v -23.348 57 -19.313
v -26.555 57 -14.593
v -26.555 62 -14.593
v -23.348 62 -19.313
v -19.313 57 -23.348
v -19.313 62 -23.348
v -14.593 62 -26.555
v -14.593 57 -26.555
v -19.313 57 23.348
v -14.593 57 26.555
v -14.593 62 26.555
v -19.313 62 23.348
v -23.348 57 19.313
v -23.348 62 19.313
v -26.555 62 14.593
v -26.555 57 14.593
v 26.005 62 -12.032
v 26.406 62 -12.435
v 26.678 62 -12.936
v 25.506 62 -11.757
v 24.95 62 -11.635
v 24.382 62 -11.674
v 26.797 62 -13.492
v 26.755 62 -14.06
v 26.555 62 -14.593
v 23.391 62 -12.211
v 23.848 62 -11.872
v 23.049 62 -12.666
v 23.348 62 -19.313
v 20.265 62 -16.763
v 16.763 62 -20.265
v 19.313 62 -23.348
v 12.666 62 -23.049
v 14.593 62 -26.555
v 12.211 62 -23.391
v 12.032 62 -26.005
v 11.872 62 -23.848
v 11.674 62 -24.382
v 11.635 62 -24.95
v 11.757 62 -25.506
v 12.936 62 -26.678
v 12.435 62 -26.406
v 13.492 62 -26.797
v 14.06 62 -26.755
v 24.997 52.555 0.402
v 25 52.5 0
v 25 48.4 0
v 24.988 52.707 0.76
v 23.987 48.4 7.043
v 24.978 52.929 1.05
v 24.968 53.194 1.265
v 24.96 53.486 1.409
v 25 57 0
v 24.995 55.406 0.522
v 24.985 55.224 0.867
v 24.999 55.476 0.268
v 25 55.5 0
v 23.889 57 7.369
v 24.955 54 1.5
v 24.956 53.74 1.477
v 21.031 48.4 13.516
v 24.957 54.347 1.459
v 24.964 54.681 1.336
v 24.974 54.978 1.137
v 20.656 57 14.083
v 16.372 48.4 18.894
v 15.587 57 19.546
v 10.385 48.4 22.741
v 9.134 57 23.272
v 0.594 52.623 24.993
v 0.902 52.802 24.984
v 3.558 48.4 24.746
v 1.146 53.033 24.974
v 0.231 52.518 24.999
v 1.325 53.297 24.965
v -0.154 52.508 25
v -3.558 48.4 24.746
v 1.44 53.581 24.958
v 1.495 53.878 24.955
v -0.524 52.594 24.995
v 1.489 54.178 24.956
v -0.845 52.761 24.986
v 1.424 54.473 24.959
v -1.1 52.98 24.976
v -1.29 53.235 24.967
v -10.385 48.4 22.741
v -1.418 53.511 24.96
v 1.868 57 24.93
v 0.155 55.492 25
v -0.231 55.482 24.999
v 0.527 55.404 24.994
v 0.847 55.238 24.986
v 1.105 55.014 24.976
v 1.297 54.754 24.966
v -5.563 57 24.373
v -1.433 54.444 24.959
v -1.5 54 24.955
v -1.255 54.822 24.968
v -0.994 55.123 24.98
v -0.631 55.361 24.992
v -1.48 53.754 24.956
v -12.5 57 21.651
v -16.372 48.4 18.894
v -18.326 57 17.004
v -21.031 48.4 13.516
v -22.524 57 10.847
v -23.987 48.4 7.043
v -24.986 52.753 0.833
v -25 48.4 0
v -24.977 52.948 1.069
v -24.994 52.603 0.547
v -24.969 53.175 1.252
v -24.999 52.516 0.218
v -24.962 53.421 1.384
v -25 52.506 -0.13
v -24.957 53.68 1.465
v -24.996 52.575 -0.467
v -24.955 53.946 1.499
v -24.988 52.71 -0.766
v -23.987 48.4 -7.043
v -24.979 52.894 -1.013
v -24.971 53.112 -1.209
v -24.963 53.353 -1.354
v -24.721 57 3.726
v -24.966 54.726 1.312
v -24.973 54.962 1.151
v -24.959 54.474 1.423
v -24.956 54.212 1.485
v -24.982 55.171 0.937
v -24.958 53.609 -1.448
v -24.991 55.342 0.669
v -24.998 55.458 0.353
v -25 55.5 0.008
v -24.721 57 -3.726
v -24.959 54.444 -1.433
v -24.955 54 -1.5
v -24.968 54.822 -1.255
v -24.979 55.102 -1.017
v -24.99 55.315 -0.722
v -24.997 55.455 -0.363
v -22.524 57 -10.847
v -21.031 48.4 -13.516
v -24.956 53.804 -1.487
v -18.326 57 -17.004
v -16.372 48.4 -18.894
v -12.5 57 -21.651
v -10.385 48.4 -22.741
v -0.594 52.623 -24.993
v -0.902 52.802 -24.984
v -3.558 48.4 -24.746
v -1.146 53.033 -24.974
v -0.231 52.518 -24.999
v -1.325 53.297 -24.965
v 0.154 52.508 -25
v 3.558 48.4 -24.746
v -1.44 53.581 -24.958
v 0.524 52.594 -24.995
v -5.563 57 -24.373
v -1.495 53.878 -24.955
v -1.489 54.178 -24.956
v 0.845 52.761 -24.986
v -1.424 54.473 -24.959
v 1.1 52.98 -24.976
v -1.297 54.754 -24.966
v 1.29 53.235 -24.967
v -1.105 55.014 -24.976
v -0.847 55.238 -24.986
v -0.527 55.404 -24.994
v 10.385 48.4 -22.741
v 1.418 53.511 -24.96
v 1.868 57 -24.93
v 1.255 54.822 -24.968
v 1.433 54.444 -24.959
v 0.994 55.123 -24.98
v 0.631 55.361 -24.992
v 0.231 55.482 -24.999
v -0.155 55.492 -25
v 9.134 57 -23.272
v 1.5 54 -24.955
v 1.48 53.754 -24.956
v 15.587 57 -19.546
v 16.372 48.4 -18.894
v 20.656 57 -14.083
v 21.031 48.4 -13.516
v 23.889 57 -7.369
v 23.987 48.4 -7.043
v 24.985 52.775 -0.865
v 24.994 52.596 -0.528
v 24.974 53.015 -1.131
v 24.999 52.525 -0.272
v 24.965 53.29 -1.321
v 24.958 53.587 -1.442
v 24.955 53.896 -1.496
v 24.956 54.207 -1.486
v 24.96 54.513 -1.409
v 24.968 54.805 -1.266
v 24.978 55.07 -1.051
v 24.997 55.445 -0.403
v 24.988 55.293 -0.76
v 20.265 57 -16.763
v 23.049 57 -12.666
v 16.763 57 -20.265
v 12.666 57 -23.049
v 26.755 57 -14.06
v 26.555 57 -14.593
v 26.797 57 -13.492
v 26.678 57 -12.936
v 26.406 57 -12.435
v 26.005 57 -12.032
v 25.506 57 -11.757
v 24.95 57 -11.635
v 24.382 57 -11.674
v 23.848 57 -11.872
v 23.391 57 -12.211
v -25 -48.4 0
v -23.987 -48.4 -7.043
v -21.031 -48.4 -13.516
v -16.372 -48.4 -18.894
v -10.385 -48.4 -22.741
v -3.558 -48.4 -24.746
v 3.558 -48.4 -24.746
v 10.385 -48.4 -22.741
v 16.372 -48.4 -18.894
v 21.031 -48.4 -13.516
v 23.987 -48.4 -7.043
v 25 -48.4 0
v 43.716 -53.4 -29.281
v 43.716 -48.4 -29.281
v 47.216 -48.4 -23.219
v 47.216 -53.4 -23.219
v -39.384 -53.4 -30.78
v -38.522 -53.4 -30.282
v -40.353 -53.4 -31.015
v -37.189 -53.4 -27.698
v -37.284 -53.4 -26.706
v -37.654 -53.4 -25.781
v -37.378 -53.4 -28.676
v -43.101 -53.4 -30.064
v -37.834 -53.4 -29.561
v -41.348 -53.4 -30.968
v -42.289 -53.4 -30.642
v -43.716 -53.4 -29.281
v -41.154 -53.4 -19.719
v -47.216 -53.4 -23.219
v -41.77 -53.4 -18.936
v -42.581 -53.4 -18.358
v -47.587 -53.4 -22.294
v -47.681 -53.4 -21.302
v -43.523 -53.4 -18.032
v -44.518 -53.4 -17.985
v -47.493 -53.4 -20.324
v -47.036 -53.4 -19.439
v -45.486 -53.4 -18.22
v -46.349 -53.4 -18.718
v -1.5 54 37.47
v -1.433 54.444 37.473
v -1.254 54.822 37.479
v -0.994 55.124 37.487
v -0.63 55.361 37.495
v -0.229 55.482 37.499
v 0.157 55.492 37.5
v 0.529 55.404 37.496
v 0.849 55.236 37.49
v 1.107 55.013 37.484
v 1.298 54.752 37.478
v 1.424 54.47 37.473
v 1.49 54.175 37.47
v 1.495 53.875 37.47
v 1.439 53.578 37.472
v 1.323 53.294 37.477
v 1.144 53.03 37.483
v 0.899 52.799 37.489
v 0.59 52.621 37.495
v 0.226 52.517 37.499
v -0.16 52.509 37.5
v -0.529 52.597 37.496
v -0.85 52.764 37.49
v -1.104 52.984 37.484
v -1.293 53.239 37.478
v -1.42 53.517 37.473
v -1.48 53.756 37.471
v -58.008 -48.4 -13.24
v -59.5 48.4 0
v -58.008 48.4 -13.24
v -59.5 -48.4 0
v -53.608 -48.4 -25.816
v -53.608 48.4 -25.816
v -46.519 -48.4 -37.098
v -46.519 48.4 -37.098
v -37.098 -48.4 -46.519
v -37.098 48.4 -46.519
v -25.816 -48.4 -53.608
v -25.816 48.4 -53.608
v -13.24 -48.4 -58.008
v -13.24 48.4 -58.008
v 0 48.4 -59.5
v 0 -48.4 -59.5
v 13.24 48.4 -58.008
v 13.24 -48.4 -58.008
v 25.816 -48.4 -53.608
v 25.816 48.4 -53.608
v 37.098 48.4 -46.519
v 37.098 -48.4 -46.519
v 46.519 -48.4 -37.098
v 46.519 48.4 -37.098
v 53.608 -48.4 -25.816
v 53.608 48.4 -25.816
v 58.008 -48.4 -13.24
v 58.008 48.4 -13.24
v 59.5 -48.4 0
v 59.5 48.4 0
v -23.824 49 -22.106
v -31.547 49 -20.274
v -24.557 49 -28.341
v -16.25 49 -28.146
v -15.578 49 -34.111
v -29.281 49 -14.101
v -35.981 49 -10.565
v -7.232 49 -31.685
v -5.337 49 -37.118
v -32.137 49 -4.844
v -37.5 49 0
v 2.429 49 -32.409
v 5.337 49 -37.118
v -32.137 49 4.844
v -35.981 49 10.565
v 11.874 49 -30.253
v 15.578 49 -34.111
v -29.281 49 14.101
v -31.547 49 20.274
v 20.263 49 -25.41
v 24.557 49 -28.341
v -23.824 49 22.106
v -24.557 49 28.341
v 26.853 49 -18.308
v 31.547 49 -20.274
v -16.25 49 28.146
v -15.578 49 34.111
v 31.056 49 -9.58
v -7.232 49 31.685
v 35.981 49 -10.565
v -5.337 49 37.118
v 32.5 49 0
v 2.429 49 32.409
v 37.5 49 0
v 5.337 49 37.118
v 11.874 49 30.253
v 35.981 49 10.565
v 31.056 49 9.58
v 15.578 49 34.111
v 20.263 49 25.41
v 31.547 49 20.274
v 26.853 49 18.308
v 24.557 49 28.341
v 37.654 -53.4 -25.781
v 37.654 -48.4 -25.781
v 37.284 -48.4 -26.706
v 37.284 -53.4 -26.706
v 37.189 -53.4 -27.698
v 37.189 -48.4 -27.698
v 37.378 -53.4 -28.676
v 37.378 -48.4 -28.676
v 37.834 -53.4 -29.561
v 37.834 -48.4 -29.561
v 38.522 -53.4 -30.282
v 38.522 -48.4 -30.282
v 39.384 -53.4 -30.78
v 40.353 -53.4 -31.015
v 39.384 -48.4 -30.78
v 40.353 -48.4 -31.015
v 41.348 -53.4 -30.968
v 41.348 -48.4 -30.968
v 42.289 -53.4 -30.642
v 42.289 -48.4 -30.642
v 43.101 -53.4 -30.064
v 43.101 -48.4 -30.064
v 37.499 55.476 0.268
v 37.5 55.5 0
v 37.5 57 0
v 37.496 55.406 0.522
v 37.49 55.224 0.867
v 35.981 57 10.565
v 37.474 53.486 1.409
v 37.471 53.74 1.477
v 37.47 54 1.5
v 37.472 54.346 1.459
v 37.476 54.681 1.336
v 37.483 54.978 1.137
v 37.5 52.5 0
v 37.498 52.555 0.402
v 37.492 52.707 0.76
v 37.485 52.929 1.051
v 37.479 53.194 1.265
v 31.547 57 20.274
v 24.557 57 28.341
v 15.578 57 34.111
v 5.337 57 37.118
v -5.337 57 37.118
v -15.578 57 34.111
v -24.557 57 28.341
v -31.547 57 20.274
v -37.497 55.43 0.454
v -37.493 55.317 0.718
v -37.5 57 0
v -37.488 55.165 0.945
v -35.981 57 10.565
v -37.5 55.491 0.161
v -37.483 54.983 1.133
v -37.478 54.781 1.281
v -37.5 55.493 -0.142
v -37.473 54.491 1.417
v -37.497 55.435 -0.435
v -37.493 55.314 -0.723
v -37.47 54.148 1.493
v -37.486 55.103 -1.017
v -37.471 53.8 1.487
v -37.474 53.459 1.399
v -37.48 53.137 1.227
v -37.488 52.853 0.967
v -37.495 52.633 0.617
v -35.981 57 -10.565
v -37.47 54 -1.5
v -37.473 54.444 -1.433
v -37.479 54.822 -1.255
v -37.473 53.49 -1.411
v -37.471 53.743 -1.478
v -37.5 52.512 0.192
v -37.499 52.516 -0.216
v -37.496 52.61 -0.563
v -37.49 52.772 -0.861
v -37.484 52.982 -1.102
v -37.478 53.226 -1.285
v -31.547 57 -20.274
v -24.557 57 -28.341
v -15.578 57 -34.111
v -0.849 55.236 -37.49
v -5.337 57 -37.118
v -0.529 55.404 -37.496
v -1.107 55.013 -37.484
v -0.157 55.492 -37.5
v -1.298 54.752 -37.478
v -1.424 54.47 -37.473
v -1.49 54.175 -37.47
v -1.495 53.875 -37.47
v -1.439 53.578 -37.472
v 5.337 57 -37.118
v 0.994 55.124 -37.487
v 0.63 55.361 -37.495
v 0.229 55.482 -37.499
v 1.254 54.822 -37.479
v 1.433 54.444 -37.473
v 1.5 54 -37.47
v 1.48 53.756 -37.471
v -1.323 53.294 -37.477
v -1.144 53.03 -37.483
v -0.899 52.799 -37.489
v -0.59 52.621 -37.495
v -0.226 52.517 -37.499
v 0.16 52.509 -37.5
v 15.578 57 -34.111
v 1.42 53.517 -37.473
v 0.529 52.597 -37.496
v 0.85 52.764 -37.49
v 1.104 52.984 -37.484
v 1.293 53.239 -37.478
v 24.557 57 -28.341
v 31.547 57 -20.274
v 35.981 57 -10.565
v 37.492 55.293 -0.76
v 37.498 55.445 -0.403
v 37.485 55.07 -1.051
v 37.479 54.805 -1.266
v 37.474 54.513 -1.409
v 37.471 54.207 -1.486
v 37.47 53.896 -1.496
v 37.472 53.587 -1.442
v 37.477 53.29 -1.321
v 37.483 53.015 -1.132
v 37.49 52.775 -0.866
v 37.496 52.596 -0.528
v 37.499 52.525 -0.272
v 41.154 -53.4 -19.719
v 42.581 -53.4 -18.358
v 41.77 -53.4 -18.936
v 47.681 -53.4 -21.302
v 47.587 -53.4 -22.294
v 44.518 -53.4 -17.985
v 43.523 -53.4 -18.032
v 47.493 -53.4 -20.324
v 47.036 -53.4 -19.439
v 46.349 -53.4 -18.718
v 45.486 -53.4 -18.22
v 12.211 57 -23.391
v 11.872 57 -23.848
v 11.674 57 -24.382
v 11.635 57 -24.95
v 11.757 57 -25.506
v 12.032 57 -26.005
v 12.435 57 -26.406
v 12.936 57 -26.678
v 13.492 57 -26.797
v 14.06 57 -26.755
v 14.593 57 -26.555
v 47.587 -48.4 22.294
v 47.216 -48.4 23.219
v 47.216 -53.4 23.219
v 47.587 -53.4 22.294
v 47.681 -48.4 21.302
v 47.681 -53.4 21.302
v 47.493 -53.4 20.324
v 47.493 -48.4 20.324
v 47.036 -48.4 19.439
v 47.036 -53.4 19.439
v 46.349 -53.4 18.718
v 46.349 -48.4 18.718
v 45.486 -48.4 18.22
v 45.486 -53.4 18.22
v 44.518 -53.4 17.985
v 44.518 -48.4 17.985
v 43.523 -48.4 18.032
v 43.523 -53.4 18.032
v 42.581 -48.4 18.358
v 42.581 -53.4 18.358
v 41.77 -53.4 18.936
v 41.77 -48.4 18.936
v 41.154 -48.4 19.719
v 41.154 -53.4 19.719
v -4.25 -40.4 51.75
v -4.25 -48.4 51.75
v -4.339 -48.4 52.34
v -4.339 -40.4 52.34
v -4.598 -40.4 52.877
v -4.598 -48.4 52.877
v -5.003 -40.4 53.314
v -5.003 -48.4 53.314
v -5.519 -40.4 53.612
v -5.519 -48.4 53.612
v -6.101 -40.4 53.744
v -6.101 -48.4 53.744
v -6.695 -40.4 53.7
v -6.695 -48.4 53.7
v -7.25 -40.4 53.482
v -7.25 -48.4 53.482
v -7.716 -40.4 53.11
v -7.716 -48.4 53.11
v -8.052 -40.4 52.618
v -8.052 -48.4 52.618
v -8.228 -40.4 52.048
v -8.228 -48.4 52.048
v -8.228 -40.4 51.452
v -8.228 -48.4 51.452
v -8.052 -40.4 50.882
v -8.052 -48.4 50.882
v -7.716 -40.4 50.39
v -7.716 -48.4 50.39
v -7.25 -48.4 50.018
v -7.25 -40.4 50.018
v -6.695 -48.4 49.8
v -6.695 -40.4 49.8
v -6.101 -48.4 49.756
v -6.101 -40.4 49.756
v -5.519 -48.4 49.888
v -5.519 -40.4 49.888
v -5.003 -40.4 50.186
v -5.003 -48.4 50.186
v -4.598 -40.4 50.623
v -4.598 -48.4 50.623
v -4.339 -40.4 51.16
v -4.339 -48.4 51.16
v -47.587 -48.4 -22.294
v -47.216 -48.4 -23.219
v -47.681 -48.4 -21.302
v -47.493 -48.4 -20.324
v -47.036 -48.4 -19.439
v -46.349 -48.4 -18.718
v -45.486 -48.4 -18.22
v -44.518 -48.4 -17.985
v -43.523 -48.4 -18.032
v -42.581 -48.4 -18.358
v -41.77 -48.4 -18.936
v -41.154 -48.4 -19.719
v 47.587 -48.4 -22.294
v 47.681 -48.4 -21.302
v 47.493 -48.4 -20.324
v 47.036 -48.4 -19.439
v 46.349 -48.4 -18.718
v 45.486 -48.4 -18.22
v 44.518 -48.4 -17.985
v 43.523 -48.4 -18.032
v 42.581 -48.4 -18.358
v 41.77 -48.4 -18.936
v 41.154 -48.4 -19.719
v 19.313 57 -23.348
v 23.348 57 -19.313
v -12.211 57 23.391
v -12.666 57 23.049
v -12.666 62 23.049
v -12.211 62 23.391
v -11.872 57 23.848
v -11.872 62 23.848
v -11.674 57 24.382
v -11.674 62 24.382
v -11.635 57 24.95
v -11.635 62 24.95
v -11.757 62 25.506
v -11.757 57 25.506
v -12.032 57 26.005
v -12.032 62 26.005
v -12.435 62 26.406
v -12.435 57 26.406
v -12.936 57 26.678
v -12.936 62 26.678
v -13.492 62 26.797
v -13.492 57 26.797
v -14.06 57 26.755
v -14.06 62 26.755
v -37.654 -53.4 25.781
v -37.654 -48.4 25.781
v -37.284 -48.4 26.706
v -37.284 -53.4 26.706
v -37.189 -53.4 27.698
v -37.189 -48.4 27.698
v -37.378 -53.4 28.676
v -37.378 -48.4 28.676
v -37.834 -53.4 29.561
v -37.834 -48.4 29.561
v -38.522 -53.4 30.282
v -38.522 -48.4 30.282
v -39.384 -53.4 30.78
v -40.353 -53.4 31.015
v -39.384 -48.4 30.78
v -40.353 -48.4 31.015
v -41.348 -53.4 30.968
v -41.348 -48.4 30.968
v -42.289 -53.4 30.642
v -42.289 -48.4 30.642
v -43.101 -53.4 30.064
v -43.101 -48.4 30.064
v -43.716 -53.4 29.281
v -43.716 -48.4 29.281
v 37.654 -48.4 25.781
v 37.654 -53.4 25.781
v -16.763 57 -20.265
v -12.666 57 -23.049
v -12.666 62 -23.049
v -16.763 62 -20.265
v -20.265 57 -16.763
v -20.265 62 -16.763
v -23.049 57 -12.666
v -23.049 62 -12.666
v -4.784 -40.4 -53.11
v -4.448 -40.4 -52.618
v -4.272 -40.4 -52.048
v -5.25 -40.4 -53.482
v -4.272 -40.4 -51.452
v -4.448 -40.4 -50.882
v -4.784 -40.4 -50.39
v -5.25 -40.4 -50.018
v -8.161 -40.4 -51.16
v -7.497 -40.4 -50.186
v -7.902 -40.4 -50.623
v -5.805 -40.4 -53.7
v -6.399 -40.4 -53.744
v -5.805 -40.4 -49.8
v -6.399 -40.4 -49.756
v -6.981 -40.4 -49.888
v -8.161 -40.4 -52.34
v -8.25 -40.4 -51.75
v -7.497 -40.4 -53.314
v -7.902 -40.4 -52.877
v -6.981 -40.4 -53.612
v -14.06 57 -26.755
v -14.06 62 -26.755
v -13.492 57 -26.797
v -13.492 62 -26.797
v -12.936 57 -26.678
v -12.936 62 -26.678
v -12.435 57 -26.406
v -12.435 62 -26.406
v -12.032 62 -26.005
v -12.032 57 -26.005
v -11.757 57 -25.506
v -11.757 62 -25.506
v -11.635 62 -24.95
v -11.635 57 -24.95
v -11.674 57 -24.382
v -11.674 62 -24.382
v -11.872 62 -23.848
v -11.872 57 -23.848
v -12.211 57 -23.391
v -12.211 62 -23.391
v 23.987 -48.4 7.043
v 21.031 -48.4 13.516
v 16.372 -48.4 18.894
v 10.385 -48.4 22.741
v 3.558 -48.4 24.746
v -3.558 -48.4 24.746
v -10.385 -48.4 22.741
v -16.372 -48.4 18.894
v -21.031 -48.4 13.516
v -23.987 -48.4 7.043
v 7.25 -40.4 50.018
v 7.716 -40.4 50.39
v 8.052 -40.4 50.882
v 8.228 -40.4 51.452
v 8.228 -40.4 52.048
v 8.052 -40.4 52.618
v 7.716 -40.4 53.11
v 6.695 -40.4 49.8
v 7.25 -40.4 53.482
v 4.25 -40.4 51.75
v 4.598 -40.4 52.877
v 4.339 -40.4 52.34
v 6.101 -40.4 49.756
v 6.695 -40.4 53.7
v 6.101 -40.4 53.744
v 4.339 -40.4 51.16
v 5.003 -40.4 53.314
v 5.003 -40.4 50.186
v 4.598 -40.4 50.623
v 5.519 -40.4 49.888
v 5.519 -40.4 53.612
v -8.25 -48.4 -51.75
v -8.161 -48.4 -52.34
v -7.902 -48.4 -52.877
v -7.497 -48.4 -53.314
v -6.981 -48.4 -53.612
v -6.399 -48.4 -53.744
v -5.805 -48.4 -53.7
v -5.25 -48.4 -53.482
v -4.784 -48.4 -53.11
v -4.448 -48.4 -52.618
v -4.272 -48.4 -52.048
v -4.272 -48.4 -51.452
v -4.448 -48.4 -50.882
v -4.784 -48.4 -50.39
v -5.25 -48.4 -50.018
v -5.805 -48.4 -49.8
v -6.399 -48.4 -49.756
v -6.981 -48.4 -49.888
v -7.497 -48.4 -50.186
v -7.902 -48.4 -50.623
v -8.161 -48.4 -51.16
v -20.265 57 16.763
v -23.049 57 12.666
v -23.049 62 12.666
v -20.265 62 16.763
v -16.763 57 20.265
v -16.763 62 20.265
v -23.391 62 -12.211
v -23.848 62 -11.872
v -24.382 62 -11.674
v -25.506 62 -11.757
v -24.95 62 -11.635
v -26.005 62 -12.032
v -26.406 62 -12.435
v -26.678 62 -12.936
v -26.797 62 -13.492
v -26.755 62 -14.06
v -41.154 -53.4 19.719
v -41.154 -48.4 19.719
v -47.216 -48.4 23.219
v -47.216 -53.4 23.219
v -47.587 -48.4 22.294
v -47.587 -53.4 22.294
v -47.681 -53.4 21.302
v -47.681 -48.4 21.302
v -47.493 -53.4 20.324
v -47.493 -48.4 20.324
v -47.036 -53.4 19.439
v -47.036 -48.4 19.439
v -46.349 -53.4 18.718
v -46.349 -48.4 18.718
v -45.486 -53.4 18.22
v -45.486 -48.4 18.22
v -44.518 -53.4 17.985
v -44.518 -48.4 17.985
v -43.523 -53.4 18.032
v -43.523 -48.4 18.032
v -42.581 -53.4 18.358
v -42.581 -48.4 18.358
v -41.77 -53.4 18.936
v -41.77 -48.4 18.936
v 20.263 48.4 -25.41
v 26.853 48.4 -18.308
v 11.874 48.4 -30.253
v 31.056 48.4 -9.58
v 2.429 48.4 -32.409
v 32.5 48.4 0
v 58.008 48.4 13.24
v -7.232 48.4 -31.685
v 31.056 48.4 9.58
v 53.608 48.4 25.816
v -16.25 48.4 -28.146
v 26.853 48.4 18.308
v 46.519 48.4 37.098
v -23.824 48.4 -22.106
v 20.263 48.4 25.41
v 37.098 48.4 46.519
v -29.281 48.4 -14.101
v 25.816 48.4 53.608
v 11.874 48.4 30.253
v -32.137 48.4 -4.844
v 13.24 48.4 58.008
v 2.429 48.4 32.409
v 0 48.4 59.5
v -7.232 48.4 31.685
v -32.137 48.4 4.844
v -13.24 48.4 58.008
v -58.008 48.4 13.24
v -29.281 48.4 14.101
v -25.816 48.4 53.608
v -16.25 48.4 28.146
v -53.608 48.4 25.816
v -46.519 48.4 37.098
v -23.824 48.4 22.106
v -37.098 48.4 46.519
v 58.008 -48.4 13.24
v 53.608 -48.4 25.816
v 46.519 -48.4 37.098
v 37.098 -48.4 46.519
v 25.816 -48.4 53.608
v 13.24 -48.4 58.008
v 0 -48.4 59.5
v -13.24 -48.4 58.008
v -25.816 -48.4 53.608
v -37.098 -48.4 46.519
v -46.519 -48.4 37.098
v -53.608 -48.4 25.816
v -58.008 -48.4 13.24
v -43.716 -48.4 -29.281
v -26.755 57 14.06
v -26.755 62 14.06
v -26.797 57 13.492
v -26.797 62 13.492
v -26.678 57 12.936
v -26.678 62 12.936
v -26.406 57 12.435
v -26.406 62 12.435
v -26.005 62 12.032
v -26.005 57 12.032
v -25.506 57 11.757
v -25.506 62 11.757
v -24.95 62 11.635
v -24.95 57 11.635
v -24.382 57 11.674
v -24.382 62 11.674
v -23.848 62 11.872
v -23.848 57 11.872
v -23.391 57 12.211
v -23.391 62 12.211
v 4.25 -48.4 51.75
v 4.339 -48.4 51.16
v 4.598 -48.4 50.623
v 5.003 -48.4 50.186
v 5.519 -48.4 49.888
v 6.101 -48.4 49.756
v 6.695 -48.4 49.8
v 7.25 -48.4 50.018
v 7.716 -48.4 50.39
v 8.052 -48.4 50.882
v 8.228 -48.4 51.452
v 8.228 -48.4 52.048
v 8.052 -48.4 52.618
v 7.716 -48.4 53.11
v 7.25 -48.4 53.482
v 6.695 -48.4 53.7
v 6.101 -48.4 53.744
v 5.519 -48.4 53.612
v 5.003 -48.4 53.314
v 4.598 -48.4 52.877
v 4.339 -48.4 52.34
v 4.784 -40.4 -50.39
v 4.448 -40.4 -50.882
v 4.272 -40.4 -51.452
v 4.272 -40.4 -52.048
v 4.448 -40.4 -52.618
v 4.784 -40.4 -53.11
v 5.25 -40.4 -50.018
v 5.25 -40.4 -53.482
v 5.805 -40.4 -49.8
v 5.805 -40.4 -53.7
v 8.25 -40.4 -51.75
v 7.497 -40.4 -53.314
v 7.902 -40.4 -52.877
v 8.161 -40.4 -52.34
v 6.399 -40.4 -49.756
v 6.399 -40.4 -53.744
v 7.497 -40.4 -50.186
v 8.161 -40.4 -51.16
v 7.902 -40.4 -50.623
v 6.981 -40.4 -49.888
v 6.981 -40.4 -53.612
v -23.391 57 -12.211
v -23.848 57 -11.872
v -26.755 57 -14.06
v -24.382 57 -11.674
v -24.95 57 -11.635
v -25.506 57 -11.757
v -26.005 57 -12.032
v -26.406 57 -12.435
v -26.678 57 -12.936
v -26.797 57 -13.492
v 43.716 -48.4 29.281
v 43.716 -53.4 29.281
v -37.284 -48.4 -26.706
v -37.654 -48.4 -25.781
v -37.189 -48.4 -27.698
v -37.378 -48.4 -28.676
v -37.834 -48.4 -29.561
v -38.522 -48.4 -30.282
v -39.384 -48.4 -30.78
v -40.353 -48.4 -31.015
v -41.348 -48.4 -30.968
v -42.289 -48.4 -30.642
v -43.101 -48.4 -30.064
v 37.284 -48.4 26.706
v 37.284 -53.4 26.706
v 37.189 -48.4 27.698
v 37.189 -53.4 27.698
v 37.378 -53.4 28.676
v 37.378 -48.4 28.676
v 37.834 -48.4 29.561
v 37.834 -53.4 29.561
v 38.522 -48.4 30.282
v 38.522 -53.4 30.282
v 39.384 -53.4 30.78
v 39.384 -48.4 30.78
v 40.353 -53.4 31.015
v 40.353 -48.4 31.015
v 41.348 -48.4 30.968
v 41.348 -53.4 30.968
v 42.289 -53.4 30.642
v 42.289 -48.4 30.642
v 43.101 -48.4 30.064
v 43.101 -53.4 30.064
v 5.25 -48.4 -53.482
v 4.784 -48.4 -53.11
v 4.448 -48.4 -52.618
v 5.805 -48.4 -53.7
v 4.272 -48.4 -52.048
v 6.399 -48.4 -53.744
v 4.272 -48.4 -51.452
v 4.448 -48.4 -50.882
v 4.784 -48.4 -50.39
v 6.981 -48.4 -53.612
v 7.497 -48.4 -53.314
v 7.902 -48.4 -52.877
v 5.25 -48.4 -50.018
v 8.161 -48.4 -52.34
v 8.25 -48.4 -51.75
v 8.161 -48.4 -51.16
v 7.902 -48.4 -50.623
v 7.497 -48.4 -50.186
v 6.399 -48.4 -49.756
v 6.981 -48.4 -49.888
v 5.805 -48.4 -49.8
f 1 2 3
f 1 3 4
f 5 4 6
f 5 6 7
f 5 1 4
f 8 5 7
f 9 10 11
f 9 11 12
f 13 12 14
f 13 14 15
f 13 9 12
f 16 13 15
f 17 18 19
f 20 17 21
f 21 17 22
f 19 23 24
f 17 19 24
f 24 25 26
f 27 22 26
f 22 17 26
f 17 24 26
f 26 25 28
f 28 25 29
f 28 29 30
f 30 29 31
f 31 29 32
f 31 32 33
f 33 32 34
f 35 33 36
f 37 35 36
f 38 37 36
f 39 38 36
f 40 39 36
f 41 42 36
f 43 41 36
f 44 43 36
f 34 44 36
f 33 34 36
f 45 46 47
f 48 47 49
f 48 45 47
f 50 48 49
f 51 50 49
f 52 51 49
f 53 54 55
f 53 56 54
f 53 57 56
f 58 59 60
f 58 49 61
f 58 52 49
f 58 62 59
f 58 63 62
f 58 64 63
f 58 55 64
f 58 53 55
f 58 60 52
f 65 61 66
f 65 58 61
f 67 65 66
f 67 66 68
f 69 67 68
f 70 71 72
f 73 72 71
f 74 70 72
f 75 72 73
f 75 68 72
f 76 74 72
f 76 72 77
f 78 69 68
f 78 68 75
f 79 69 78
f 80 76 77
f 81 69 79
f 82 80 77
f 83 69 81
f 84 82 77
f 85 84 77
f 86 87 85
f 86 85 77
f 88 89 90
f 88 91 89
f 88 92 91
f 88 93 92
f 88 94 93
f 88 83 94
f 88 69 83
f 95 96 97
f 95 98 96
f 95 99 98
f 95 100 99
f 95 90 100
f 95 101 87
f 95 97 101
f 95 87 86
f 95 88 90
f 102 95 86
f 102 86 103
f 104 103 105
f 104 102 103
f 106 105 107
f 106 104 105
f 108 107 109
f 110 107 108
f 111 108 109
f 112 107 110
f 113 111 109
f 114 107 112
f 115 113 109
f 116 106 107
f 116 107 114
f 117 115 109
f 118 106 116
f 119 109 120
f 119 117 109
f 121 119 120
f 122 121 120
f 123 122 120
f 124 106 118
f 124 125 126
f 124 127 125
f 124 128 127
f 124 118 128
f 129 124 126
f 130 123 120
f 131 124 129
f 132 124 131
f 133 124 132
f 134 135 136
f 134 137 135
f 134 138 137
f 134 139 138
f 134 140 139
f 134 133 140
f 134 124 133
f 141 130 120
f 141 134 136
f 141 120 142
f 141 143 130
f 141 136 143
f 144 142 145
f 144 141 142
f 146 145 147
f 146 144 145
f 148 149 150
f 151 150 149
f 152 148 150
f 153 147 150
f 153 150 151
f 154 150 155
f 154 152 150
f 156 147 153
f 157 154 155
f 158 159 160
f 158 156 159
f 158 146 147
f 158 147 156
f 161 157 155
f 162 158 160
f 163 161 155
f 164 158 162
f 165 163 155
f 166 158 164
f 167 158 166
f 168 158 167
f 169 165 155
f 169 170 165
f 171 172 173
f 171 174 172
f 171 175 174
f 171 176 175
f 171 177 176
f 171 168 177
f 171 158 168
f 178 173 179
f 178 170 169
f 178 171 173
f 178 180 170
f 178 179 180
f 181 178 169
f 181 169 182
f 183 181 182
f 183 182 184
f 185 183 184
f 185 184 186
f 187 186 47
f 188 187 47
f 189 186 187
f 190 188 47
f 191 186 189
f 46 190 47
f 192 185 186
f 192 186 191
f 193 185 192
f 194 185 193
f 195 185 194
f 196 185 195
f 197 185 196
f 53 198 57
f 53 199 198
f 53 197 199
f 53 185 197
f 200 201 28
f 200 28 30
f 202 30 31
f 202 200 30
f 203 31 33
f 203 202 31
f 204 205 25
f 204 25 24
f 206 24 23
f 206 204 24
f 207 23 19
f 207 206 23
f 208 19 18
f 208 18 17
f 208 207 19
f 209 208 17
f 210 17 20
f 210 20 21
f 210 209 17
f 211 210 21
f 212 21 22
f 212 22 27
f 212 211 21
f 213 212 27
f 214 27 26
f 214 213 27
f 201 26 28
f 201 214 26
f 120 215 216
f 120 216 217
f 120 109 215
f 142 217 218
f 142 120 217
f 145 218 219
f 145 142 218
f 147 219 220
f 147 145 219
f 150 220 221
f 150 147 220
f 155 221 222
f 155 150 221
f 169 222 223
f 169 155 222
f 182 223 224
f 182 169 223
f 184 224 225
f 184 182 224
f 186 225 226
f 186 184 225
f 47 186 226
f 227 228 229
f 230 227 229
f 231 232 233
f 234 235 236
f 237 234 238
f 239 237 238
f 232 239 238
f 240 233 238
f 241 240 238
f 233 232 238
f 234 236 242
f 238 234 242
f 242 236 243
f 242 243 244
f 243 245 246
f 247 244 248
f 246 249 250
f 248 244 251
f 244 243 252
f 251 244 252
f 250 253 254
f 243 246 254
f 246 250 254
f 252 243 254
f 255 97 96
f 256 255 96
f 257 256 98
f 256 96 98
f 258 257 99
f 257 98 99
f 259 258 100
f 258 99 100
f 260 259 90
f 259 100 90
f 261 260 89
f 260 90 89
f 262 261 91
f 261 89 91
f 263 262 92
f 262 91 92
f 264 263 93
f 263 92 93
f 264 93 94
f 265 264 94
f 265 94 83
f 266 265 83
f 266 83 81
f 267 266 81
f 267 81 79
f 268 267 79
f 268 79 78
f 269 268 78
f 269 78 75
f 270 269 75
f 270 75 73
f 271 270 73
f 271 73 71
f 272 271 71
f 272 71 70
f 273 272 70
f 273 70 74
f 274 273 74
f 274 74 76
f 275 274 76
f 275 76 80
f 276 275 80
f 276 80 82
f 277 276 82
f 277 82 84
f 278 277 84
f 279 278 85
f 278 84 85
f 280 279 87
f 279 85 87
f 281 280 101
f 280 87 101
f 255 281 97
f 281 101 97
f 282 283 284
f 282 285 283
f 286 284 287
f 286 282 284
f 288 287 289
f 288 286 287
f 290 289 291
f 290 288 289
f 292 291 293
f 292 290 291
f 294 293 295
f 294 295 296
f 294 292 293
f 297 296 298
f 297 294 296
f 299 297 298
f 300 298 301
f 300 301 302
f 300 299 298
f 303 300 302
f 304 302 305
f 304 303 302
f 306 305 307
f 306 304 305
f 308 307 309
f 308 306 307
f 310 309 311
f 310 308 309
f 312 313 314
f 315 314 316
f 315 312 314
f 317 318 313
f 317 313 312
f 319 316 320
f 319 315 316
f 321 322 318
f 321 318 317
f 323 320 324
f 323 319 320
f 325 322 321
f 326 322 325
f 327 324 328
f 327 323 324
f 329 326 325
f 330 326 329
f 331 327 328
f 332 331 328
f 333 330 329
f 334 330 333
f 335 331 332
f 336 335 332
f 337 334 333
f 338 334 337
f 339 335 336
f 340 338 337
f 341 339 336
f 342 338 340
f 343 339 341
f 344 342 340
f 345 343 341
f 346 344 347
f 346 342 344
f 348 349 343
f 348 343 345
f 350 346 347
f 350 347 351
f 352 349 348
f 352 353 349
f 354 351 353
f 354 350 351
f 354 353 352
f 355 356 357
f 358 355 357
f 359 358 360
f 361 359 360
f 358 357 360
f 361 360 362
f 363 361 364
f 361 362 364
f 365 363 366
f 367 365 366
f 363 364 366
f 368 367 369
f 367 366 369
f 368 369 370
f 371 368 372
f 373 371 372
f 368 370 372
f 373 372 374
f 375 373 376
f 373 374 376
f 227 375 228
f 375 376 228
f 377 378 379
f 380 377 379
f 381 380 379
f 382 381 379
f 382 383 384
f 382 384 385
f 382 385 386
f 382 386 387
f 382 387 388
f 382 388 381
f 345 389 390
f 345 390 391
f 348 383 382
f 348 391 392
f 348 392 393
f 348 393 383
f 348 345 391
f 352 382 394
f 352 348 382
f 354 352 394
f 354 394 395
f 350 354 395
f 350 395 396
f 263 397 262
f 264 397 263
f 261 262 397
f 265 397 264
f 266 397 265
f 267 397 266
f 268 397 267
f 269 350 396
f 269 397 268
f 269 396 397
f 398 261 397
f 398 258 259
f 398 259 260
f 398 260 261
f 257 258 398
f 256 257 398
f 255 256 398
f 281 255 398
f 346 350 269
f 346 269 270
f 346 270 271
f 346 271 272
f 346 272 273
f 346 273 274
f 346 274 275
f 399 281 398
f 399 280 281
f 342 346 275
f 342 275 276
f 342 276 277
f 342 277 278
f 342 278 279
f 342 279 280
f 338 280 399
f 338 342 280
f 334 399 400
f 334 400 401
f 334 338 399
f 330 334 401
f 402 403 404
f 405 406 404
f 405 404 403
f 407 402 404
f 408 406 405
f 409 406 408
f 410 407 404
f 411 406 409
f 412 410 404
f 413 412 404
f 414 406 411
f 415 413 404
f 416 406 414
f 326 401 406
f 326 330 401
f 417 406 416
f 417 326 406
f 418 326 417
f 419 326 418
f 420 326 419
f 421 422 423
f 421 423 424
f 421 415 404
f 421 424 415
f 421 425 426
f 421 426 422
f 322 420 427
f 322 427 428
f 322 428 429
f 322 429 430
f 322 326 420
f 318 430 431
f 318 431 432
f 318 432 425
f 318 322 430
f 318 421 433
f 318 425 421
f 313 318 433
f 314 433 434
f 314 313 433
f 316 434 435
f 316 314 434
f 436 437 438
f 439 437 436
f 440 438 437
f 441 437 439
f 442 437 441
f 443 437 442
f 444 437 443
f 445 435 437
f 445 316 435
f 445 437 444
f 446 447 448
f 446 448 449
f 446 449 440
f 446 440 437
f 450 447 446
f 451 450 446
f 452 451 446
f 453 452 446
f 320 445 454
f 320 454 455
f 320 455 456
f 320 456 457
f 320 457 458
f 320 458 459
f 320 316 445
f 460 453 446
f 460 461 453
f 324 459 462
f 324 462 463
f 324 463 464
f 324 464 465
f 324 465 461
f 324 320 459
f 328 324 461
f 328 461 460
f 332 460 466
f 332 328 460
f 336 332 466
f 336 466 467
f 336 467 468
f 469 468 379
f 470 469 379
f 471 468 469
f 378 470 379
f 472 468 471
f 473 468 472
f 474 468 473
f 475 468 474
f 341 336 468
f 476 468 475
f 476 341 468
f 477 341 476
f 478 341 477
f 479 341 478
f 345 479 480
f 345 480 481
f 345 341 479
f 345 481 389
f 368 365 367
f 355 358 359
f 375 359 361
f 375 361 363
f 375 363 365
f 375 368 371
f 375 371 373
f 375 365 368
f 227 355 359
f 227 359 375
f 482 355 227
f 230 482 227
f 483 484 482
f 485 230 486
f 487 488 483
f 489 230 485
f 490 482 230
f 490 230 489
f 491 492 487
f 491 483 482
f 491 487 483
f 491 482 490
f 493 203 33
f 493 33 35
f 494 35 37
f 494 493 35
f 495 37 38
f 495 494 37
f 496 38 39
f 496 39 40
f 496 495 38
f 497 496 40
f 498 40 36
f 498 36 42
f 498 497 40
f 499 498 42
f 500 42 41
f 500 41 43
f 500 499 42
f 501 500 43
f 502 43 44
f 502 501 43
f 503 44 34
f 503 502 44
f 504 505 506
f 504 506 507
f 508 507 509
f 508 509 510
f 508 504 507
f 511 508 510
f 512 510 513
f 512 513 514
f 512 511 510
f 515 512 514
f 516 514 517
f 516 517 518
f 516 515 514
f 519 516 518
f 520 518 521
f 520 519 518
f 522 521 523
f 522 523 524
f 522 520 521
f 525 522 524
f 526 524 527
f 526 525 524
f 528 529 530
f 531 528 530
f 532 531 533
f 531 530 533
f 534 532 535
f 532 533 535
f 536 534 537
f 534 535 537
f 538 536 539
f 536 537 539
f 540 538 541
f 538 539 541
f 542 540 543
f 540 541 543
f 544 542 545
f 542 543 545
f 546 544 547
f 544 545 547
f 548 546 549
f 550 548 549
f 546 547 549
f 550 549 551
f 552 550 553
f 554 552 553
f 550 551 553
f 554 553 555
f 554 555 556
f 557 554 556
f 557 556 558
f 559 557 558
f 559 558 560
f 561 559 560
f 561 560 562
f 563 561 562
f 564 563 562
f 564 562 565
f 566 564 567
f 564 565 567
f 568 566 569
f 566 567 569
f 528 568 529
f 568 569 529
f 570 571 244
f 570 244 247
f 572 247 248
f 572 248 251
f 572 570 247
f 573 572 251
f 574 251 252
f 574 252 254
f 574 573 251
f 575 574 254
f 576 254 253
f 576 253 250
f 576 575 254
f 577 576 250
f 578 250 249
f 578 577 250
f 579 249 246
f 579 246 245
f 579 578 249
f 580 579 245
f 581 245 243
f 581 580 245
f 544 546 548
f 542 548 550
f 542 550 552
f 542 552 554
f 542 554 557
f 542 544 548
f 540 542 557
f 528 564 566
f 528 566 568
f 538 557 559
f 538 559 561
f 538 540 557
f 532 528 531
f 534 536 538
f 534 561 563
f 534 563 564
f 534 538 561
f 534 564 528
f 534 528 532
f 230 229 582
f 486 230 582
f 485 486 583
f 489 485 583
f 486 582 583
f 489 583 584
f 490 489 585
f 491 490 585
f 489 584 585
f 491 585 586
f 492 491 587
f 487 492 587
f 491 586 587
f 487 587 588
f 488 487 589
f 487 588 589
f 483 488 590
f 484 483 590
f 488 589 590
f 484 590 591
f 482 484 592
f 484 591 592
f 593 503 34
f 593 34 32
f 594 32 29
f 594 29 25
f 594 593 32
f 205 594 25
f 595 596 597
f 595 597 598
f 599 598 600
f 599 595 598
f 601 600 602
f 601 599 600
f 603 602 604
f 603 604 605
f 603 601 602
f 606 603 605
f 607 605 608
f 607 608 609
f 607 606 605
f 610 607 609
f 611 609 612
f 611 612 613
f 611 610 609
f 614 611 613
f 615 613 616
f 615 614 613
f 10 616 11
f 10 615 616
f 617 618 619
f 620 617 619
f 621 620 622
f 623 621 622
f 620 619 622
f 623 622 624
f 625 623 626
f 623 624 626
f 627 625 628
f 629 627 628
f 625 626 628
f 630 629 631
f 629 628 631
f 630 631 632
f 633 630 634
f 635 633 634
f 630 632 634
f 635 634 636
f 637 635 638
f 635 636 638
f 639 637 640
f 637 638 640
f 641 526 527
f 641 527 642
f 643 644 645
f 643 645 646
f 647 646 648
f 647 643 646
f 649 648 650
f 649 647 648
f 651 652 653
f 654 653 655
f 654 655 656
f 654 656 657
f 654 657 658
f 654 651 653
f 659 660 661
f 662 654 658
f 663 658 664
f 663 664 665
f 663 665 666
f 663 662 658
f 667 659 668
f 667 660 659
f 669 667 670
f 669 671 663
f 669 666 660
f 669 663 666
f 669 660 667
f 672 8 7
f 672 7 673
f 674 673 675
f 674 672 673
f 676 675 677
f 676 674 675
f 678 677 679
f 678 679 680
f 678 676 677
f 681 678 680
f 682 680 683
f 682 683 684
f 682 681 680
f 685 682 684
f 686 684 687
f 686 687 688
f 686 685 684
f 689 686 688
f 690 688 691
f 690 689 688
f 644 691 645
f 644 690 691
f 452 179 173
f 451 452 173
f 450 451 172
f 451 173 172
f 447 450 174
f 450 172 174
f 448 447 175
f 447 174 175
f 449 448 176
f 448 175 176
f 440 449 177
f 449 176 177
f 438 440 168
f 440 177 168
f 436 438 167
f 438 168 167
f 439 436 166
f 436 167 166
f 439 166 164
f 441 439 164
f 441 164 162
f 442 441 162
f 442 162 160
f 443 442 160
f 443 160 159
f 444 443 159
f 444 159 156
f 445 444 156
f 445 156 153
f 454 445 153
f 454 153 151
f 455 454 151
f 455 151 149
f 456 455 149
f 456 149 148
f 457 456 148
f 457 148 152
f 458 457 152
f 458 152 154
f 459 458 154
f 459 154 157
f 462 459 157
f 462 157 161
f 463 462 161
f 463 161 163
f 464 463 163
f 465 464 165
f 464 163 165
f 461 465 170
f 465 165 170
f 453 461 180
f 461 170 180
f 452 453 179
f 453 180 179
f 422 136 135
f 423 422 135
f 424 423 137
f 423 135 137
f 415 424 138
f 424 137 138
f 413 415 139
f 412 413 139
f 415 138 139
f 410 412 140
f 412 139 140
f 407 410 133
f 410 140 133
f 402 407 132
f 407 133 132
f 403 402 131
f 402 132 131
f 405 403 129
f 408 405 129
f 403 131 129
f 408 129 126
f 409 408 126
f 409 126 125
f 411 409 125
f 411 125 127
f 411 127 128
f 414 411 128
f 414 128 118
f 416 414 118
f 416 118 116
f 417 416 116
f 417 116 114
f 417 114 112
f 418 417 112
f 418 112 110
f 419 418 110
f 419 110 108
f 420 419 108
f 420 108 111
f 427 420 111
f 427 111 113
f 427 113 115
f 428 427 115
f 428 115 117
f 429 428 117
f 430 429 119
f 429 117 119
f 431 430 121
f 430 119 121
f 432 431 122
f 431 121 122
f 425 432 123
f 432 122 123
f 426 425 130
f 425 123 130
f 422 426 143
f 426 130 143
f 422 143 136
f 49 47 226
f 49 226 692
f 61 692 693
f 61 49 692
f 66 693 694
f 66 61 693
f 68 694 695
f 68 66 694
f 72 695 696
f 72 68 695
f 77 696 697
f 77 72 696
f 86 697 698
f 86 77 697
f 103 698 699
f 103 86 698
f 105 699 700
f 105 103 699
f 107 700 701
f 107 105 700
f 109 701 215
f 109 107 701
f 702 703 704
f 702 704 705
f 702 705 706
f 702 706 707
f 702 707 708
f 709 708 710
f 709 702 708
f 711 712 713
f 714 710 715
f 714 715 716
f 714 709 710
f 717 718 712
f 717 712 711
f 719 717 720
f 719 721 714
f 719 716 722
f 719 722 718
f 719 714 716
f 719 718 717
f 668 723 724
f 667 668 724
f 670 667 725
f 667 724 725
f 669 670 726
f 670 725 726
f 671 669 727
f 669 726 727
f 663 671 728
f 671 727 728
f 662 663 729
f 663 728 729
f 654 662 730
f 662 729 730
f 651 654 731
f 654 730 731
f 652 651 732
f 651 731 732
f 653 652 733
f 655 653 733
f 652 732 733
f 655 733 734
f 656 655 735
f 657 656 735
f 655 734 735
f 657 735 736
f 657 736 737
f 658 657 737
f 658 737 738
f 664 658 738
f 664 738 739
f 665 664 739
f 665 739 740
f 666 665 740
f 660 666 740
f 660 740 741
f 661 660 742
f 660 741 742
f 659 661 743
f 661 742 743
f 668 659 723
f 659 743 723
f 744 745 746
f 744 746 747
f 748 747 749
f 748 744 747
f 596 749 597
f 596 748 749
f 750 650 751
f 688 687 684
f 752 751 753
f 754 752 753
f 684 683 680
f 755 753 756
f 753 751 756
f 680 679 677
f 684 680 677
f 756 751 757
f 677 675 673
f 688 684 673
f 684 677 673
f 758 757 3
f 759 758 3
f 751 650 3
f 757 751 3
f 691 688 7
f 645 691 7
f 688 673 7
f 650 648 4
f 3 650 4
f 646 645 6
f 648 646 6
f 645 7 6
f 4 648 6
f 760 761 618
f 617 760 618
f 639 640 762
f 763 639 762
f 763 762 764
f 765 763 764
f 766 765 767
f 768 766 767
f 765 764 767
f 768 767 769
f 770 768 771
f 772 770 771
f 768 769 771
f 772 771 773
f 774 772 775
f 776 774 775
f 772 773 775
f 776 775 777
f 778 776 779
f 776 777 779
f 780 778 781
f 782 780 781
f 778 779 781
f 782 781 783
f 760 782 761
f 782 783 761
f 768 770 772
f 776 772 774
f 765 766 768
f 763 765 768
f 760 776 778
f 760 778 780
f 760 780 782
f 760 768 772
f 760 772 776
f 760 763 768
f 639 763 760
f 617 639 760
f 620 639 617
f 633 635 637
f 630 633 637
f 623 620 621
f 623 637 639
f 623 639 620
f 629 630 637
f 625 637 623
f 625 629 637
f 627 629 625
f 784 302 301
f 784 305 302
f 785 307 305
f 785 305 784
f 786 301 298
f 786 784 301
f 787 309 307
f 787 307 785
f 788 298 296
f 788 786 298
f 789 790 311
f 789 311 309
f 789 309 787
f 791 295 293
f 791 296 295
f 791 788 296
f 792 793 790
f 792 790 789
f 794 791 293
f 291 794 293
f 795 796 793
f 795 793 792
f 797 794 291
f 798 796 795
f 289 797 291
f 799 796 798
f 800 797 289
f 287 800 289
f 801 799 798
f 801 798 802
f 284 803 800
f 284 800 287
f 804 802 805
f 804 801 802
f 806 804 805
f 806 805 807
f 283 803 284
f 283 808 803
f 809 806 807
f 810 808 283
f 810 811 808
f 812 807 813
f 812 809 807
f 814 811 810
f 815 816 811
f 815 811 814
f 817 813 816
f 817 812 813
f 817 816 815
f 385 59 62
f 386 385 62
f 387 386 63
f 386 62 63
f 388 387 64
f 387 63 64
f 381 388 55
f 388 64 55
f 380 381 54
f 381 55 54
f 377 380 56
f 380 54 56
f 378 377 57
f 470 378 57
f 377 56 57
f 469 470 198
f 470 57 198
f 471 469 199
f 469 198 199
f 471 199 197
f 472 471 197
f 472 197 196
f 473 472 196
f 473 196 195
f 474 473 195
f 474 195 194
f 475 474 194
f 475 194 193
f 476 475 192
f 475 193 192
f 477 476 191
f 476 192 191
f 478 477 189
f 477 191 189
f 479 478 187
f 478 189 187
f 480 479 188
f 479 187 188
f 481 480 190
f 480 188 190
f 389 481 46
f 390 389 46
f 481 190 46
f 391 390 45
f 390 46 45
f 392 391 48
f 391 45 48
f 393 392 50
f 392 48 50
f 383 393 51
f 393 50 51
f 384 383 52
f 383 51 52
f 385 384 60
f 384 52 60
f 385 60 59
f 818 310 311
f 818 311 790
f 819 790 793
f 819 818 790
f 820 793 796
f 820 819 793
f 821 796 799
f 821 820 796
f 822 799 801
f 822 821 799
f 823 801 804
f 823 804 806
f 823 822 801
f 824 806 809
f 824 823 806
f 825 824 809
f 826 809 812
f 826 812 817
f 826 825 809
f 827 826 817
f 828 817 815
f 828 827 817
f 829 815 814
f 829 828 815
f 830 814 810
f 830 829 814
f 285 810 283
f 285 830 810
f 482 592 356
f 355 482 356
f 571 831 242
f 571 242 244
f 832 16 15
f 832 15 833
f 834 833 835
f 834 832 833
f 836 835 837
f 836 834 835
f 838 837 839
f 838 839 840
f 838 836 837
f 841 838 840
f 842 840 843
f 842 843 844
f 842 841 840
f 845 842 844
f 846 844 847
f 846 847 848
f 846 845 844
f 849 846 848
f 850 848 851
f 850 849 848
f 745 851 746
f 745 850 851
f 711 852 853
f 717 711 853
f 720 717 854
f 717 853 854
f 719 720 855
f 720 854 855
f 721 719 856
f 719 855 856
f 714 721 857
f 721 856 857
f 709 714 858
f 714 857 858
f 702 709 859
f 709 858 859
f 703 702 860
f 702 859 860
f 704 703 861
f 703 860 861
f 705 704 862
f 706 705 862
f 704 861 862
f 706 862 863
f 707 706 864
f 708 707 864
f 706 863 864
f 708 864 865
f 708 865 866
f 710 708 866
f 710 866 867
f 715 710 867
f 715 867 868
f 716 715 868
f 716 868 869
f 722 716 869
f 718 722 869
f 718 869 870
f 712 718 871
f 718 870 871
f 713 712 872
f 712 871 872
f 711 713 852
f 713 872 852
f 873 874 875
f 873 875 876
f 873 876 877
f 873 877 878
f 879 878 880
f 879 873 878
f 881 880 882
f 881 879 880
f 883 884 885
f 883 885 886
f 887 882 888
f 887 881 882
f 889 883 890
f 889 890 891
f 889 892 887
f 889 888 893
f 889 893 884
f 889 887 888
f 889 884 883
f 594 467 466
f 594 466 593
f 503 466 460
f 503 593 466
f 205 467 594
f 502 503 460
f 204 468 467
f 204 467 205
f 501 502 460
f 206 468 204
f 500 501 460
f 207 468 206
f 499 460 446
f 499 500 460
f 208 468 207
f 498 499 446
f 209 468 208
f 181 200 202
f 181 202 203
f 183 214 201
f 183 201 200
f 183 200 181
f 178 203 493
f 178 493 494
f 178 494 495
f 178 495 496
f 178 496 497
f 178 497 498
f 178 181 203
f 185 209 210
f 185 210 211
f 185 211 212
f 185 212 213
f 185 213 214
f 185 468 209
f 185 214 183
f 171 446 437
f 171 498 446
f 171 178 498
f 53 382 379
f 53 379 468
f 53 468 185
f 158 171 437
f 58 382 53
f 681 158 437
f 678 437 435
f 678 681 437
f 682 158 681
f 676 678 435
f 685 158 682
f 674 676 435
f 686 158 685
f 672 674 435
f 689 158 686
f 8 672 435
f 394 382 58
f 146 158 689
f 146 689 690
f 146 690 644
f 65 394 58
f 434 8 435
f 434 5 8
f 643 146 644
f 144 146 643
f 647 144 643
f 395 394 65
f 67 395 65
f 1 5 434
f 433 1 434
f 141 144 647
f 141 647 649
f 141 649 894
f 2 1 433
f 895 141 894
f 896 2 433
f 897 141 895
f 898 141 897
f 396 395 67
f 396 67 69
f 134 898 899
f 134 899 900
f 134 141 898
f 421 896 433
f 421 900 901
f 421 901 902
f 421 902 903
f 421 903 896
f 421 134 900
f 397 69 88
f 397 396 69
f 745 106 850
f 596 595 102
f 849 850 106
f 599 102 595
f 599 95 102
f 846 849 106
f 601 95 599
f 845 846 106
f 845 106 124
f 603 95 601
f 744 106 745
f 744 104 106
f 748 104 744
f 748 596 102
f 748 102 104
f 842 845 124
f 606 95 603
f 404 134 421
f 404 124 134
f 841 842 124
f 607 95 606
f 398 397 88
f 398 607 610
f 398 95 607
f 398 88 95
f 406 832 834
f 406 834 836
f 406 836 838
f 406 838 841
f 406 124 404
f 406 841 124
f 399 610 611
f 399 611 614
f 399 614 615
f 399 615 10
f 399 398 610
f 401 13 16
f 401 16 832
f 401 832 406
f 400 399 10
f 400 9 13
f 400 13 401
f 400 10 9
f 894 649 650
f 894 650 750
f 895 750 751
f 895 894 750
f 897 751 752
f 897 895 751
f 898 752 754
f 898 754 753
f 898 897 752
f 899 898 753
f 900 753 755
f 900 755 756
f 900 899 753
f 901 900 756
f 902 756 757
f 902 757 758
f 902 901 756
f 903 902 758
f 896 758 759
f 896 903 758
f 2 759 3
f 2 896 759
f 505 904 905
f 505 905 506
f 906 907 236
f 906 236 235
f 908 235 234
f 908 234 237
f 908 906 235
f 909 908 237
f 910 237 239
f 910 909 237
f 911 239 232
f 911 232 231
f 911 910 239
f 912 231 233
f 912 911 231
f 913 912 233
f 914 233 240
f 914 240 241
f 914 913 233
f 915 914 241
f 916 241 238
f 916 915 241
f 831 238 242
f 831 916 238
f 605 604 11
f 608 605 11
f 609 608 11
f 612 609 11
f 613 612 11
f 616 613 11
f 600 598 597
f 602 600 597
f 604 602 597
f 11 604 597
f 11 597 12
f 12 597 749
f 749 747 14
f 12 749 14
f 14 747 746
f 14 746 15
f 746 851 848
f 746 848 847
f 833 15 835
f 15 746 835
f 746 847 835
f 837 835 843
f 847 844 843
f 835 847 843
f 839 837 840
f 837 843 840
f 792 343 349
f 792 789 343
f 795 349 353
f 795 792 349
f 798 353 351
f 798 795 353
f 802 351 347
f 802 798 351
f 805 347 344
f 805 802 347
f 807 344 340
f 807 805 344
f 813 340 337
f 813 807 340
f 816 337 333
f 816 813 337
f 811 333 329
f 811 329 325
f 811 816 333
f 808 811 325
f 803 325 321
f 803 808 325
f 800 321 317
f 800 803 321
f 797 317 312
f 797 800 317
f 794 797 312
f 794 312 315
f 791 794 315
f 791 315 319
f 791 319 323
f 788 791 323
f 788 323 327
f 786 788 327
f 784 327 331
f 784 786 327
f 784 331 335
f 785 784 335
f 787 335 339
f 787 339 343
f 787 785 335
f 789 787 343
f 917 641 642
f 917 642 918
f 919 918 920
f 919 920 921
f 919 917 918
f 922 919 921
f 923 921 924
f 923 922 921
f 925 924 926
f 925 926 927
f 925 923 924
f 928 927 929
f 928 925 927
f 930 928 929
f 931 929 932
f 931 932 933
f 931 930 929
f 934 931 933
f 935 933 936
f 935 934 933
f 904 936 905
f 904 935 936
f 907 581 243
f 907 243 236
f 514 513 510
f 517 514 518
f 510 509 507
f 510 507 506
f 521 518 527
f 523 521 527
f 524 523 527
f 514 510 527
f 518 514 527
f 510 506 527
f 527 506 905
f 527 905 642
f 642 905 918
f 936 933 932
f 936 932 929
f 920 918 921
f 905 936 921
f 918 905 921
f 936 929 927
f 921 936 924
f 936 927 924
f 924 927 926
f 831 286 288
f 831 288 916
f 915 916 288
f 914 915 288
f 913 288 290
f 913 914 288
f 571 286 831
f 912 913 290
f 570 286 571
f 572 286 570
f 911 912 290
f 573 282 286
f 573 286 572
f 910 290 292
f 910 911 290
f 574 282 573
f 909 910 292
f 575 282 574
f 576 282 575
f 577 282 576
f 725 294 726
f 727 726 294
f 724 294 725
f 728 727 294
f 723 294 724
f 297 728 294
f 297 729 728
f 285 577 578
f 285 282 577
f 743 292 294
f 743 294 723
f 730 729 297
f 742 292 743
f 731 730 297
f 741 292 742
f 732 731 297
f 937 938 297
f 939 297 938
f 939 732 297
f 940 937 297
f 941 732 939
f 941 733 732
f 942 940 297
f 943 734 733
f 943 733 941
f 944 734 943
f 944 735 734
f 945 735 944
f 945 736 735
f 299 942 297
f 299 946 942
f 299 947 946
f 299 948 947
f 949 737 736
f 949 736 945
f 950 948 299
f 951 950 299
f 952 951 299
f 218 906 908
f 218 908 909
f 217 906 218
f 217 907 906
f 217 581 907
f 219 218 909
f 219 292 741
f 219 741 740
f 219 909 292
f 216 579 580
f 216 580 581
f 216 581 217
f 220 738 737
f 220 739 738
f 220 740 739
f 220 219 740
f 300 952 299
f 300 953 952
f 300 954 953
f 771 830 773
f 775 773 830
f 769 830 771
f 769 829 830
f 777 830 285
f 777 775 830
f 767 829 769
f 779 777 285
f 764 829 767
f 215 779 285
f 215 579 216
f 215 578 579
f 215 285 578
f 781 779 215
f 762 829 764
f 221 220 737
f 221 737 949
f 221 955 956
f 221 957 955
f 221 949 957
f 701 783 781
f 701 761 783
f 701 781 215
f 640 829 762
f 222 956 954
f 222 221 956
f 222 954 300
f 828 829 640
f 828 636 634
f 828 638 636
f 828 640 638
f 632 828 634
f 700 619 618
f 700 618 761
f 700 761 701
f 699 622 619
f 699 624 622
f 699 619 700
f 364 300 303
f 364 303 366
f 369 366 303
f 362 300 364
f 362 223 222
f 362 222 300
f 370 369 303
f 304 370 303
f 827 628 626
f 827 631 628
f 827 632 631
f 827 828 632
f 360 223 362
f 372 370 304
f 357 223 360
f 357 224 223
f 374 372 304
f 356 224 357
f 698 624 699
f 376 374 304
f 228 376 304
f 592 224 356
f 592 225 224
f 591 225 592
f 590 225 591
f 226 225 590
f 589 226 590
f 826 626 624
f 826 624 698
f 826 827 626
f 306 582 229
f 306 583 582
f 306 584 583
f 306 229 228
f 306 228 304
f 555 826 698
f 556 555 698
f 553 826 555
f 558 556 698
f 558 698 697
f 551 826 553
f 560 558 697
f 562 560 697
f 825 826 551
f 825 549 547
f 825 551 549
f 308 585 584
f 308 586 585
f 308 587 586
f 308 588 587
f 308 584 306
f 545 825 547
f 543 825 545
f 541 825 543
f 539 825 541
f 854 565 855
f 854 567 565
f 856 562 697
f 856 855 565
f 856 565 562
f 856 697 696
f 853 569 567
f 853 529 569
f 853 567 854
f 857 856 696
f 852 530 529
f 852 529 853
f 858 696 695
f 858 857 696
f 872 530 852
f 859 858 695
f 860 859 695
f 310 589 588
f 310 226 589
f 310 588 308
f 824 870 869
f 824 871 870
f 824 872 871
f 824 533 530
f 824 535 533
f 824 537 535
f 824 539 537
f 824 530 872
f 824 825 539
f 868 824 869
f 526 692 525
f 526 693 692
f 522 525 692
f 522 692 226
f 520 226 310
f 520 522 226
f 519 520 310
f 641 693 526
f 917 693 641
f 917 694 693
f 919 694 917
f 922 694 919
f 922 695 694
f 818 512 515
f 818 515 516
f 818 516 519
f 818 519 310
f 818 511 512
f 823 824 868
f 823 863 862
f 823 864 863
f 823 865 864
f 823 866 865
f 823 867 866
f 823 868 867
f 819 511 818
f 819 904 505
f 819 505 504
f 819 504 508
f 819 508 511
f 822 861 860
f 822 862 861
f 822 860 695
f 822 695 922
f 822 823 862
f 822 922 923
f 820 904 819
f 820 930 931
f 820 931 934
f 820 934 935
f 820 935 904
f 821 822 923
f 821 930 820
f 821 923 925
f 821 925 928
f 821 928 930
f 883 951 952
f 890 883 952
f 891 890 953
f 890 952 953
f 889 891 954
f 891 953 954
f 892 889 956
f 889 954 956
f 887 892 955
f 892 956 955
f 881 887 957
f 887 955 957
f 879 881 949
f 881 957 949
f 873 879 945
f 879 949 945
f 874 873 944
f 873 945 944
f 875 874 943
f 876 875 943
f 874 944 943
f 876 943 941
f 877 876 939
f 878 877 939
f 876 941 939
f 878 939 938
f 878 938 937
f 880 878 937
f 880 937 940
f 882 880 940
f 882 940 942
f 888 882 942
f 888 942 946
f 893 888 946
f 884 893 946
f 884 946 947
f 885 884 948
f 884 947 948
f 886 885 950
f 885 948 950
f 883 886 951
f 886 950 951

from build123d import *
from build123d.topology import SkipClean

# Parameters (mm, degrees)
SKETCH_1_W               = 34.5
SKETCH_1_H               = 96.8
SKETCH_3_R               = 1.5
CUT_EXTRUDE_1_DEPTH      = 102.634147805
PATTERN_CIRCULAR_1_COUNT = 4
EXTRUDE_2_DEPTH          = 5
EXTRUDE_3_DEPTH          = 5
SKETCH_4_R               = 2
CUT_EXTRUDE_2_DEPTH      = 8


with BuildPart() as part:
    # 草图1 → 旋转1 (revolve)
    with SkipClean():  # the faces are left unmerged after this step: merging them gives an invalid solid
        with BuildSketch(Plane.XY, mode=Mode.PRIVATE) as revolve_1_sk:
            with Locations((42.25, 0)):
                Rectangle(SKETCH_1_W, SKETCH_1_H)
            Polygon((-25, 57), (-37.5, 57), (-37.5, 49), (-32.5, 49), (-32.5, 48.4), (-59.5, 48.4), (-59.5, -48.4), (-25, -48.4), align=None)
        revolve(revolve_1_sk.sketch.rotate(Axis((0, 57, 0), (0, -1, 0)), 180), axis=Axis((0, 57, 0), (0, -1, 0)))

    # 草图3 → 切除-拉伸1 (cut, through all)
    with SkipClean():  # the faces are left unmerged after this step: merging them gives an invalid solid
        with BuildSketch(Plane.XY):
            with Locations((0, 54)):
                Circle(SKETCH_3_R)
        cut_extrude_1 = extrude(amount=-CUT_EXTRUDE_1_DEPTH, mode=Mode.SUBTRACT)

    # 阵列(圆周)1: 切除-拉伸1 ×4 about axis
    with SkipClean():  # the faces are left unmerged after this step: merging them gives an invalid solid
        pattern_circular_1_axis = Axis((0, 57, 0), (0, 1, 0))
        for i in range(1, PATTERN_CIRCULAR_1_COUNT):
            add(cut_extrude_1.rotate(pattern_circular_1_axis, i * 360 / PATTERN_CIRCULAR_1_COUNT), mode=Mode.SUBTRACT)

    # 草图5 → 凸台-拉伸2 (add)
    with SkipClean():  # the faces are left unmerged after this step: merging them gives an invalid solid
        with BuildSketch(Plane(origin=(0, 57, 0), x_dir=(1, 0, 0), z_dir=(0, 1, 0))):
            with BuildLine():
                ThreePointArc((14.592688862, 26.554536934), (21.42533547, 21.42533547), (26.554536934, 14.592688862))
                ThreePointArc((26.554536934, 14.592688862), (25.764976005, 11.876700361), (23.048987504, 12.66626129))
                ThreePointArc((23.048987504, 12.66626129), (18.596908345, 18.596908345), (12.66626129, 23.048987504))
                ThreePointArc((12.66626129, 23.048987504), (11.876700361, 25.764976005), (14.592688862, 26.554536934))
            make_face()
            with BuildLine():
                ThreePointArc((-26.554536934, -14.592688862), (-25.764976005, -11.876700361), (-23.048987504, -12.66626129))
                ThreePointArc((-23.048987504, -12.66626129), (-18.596908345, -18.596908345), (-12.66626129, -23.048987504))
                ThreePointArc((-12.66626129, -23.048987504), (-11.876700361, -25.764976005), (-14.592688862, -26.554536934))
                ThreePointArc((-14.592688862, -26.554536934), (-21.42533547, -21.42533547), (-26.554536934, -14.592688862))
            make_face()
            with BuildLine():
                ThreePointArc((-14.592688862, 26.554536934), (-11.876700361, 25.764976005), (-12.66626129, 23.048987504))
                ThreePointArc((-12.66626129, 23.048987504), (-18.596908345, 18.596908345), (-23.048987504, 12.66626129))
                ThreePointArc((-23.048987504, 12.66626129), (-25.764976005, 11.876700361), (-26.554536934, 14.592688862))
                ThreePointArc((-26.554536934, 14.592688862), (-21.42533547, 21.42533547), (-14.592688862, 26.554536934))
            make_face()
        extrude(amount=EXTRUDE_2_DEPTH)

    # 草图6 → 凸台-拉伸3 (add)
    with SkipClean():  # the faces are left unmerged after this step: merging them gives an invalid solid
        with BuildSketch(Plane.XZ.offset(48.4)):
            with BuildLine():
                Line((43.716333699, 29.281088913), (47.216333699, 23.218911087))
                ThreePointArc((47.216333699, 23.218911087), (45.935244785, 18.437822174), (41.154155872, 19.718911087))
                Line((41.154155872, 19.718911087), (37.654155872, 25.781088913))
                ThreePointArc((37.654155872, 25.781088913), (38.935244785, 30.562177826), (43.716333699, 29.281088913))
            make_face()
            with BuildLine():
                Line((43.716333699, -29.281088913), (47.216333699, -23.218911087))
                ThreePointArc((47.216333699, -23.218911087), (45.935244785, -18.437822174), (41.154155872, -19.718911087))
                Line((41.154155872, -19.718911087), (37.654155872, -25.781088913))
                ThreePointArc((37.654155872, -25.781088913), (38.935244785, -30.562177826), (43.716333699, -29.281088913))
            make_face()
            with BuildLine():
                Line((-43.716333699, -29.281088913), (-47.216333699, -23.218911087))
                ThreePointArc((-47.216333699, -23.218911087), (-45.935244785, -18.437822174), (-41.154155872, -19.718911087))
                Line((-41.154155872, -19.718911087), (-37.654155872, -25.781088913))
                ThreePointArc((-37.654155872, -25.781088913), (-38.935244785, -30.562177826), (-43.716333699, -29.281088913))
            make_face()
            with BuildLine():
                Line((-43.716333699, 29.281088913), (-47.216333699, 23.218911087))
                ThreePointArc((-47.216333699, 23.218911087), (-45.935244785, 18.437822174), (-41.154155872, 19.718911087))
                Line((-41.154155872, 19.718911087), (-37.654155872, 25.781088913))
                ThreePointArc((-37.654155872, 25.781088913), (-38.935244785, 30.562177826), (-43.716333699, 29.281088913))
            make_face()
        extrude(amount=EXTRUDE_3_DEPTH)

    # 草图4 → 切除-拉伸2 (cut)
    with SkipClean():  # the faces are left unmerged after this step: merging them gives an invalid solid
        with BuildSketch(Plane.XZ.offset(48.4)):
            with Locations((-6.25, 51.75)):
                Circle(SKETCH_4_R)
            with Locations(Location((6.25, 51.75, 0), (0, 0, 180))):
                Circle(SKETCH_4_R)
            with Locations(Location((-6.25, -51.75, 0), (0, 0, 180))):
                Circle(SKETCH_4_R)
            with Locations((6.25, -51.75)):
                Circle(SKETCH_4_R)
        extrude(amount=-CUT_EXTRUDE_2_DEPTH, mode=Mode.SUBTRACT)


solid = part.part
